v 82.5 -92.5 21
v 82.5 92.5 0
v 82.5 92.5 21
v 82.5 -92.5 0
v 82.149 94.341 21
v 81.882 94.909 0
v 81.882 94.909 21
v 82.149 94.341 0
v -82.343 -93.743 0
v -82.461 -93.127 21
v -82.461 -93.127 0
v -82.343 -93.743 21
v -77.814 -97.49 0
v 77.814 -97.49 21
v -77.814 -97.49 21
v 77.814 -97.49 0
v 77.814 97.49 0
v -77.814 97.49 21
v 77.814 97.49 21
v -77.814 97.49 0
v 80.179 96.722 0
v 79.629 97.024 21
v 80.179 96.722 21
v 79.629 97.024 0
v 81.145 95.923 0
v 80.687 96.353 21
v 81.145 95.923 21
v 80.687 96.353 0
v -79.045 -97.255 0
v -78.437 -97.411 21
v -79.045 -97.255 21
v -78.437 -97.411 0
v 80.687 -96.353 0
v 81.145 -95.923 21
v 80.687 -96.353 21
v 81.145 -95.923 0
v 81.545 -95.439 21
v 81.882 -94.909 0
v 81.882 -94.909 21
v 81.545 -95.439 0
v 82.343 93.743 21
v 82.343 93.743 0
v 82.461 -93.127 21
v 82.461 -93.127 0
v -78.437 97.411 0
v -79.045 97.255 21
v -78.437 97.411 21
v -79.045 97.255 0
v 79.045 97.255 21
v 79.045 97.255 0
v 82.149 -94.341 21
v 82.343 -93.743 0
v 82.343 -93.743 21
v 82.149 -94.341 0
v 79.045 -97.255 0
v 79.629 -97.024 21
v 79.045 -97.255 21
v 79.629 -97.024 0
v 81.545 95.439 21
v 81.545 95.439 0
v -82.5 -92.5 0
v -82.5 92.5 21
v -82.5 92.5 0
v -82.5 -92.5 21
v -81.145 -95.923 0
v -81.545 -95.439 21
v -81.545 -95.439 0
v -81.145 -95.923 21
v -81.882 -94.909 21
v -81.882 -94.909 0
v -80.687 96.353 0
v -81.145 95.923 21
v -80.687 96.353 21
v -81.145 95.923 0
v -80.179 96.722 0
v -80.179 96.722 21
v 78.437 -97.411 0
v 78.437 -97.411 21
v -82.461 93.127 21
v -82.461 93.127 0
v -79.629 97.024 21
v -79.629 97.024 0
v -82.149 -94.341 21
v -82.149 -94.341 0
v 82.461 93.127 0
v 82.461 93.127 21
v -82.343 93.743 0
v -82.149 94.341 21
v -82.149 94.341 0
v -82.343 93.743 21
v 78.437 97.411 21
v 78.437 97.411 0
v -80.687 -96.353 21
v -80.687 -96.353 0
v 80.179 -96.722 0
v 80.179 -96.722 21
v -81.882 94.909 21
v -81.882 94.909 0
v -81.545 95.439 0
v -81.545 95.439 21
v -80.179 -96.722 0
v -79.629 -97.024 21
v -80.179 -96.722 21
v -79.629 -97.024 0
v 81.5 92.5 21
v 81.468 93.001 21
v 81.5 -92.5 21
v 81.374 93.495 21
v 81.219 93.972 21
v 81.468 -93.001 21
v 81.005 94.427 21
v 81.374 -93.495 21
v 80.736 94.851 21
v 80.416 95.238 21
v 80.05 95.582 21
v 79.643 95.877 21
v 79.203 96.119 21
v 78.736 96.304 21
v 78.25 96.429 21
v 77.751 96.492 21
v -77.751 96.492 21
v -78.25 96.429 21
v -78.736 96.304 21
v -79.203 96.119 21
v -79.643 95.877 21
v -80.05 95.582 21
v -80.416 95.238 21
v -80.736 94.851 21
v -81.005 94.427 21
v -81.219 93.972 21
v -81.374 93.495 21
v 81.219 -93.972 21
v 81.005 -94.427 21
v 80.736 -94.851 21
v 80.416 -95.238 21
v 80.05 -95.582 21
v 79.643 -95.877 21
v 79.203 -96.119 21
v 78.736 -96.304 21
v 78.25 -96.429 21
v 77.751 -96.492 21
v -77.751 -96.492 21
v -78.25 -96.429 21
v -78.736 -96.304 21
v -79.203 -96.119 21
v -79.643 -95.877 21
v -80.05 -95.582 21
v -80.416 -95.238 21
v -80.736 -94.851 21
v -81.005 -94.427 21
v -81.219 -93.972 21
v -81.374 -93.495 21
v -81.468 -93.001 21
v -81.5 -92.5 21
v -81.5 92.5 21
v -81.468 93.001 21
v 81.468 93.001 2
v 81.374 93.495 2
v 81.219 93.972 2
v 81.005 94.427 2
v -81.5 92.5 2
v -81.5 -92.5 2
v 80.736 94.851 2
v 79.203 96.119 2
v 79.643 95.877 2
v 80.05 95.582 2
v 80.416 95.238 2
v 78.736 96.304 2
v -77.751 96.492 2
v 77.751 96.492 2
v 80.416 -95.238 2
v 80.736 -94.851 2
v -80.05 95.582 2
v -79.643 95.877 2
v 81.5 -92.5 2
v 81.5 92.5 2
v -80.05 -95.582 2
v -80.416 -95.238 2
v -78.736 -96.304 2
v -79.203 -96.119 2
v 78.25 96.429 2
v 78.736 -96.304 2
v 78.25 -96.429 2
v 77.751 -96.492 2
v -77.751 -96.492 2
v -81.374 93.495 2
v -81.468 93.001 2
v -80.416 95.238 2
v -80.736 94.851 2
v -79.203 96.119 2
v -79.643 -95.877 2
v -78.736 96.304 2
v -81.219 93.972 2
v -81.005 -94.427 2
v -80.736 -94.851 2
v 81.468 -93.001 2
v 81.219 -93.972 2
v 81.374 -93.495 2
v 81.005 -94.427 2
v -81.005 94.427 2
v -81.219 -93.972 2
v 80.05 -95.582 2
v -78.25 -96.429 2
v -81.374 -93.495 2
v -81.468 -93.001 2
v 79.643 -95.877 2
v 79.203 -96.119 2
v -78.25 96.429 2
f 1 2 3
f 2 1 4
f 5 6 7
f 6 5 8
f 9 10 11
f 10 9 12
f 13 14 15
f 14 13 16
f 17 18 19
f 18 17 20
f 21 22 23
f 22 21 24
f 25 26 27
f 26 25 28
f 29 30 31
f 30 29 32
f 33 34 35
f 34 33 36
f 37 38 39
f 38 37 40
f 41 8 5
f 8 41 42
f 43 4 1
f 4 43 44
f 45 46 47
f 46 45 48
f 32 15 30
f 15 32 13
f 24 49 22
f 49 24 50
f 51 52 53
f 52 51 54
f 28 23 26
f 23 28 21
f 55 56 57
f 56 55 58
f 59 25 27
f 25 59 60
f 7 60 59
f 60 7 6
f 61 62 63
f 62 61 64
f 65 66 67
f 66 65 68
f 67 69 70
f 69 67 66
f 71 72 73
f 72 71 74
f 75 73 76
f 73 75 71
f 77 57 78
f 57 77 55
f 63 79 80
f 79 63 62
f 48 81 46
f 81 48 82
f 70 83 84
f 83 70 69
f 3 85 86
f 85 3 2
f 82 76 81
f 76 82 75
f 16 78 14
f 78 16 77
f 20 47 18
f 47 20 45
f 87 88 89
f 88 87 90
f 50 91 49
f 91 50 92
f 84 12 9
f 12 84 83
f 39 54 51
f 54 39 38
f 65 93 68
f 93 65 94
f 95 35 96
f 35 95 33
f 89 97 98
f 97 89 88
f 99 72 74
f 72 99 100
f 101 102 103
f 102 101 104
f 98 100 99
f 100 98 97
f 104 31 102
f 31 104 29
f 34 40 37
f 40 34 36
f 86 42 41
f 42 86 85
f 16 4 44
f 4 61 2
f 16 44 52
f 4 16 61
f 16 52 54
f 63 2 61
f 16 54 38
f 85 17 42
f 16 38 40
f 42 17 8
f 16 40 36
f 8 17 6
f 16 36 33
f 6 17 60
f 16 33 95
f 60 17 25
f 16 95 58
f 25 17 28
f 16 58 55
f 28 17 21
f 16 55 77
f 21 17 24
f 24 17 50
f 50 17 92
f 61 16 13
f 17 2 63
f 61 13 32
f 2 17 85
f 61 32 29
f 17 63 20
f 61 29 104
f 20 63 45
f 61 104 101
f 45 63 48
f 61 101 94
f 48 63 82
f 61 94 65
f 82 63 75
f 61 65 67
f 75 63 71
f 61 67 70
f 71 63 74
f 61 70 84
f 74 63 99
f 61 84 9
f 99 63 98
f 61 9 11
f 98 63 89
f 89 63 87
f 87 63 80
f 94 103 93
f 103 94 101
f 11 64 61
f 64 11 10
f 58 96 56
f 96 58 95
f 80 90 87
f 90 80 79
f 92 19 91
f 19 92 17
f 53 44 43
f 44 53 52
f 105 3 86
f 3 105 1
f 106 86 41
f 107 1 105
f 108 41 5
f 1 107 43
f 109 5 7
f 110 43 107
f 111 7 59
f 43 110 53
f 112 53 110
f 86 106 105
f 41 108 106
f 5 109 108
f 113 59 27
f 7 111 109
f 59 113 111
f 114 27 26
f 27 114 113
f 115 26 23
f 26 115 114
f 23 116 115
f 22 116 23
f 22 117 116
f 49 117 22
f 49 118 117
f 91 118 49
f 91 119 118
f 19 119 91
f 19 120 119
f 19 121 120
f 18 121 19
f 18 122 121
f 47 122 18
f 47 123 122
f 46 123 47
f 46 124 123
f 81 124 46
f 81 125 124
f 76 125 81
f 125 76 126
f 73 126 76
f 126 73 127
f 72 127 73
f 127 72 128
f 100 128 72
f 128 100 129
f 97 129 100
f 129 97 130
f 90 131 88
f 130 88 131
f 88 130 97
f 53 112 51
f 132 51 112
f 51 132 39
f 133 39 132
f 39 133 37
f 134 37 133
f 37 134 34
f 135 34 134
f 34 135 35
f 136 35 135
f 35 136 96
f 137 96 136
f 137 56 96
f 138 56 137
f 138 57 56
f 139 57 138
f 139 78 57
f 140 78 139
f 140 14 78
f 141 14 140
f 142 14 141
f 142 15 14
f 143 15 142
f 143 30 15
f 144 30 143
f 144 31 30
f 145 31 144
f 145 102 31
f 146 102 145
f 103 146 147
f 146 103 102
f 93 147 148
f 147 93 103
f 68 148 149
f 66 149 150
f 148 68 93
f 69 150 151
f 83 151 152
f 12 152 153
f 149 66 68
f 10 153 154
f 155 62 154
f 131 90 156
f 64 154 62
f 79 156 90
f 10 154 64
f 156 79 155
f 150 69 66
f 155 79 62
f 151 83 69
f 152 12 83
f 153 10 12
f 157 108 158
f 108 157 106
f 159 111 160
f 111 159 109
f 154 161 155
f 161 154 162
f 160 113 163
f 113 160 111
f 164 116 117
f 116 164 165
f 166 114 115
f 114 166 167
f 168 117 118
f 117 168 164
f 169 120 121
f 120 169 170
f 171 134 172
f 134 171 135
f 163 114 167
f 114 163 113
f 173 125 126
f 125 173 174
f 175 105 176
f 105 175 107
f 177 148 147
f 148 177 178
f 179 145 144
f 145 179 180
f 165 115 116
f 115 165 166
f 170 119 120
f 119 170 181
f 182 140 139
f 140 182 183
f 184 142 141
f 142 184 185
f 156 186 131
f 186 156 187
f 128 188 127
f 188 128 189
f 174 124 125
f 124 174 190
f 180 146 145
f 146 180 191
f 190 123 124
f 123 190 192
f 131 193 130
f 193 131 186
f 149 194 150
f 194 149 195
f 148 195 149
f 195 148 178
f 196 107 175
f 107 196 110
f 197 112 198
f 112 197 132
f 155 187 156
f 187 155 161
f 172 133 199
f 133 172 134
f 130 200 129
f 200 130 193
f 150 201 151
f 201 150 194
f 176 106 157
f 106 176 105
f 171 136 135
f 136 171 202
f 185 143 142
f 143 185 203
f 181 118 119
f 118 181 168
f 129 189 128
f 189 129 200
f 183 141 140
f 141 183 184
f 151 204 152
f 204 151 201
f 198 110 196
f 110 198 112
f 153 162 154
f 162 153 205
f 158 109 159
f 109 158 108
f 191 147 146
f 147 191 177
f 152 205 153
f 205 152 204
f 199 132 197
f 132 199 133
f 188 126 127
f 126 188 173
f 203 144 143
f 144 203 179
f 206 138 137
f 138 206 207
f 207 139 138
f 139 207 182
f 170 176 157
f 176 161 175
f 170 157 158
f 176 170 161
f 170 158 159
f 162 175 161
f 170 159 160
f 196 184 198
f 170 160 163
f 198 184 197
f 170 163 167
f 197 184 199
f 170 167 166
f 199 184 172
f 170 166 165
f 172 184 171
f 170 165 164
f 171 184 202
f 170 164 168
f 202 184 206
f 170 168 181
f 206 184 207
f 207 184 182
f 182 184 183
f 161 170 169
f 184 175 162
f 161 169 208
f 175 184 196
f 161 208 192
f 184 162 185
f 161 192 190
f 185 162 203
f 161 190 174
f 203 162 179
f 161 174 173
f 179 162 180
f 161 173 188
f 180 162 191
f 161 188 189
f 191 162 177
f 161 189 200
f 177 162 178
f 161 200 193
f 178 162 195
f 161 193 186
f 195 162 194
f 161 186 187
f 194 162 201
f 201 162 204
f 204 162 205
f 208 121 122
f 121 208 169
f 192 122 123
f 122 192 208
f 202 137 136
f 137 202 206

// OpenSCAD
$fn = 50;


difference() {
	union() {
		hull() {
			translate(v = [-77.5000000000, 92.5000000000, 0]) {
				cylinder(h = 21, r = 5);
			}
			translate(v = [77.5000000000, 92.5000000000, 0]) {
				cylinder(h = 21, r = 5);
			}
			translate(v = [-77.5000000000, -92.5000000000, 0]) {
				cylinder(h = 21, r = 5);
			}
			translate(v = [77.5000000000, -92.5000000000, 0]) {
				cylinder(h = 21, r = 5);
			}
		}
	}
	union() {
		translate(v = [0, 0, 2]) {
			hull() {
				translate(v = [-77.5000000000, 92.5000000000, 0]) {
					cylinder(h = 19, r = 4);
				}
				translate(v = [77.5000000000, 92.5000000000, 0]) {
					cylinder(h = 19, r = 4);
				}
				translate(v = [-77.5000000000, -92.5000000000, 0]) {
					cylinder(h = 19, r = 4);
				}
				translate(v = [77.5000000000, -92.5000000000, 0]) {
					cylinder(h = 19, r = 4);
				}
			}
		}
	}
}
